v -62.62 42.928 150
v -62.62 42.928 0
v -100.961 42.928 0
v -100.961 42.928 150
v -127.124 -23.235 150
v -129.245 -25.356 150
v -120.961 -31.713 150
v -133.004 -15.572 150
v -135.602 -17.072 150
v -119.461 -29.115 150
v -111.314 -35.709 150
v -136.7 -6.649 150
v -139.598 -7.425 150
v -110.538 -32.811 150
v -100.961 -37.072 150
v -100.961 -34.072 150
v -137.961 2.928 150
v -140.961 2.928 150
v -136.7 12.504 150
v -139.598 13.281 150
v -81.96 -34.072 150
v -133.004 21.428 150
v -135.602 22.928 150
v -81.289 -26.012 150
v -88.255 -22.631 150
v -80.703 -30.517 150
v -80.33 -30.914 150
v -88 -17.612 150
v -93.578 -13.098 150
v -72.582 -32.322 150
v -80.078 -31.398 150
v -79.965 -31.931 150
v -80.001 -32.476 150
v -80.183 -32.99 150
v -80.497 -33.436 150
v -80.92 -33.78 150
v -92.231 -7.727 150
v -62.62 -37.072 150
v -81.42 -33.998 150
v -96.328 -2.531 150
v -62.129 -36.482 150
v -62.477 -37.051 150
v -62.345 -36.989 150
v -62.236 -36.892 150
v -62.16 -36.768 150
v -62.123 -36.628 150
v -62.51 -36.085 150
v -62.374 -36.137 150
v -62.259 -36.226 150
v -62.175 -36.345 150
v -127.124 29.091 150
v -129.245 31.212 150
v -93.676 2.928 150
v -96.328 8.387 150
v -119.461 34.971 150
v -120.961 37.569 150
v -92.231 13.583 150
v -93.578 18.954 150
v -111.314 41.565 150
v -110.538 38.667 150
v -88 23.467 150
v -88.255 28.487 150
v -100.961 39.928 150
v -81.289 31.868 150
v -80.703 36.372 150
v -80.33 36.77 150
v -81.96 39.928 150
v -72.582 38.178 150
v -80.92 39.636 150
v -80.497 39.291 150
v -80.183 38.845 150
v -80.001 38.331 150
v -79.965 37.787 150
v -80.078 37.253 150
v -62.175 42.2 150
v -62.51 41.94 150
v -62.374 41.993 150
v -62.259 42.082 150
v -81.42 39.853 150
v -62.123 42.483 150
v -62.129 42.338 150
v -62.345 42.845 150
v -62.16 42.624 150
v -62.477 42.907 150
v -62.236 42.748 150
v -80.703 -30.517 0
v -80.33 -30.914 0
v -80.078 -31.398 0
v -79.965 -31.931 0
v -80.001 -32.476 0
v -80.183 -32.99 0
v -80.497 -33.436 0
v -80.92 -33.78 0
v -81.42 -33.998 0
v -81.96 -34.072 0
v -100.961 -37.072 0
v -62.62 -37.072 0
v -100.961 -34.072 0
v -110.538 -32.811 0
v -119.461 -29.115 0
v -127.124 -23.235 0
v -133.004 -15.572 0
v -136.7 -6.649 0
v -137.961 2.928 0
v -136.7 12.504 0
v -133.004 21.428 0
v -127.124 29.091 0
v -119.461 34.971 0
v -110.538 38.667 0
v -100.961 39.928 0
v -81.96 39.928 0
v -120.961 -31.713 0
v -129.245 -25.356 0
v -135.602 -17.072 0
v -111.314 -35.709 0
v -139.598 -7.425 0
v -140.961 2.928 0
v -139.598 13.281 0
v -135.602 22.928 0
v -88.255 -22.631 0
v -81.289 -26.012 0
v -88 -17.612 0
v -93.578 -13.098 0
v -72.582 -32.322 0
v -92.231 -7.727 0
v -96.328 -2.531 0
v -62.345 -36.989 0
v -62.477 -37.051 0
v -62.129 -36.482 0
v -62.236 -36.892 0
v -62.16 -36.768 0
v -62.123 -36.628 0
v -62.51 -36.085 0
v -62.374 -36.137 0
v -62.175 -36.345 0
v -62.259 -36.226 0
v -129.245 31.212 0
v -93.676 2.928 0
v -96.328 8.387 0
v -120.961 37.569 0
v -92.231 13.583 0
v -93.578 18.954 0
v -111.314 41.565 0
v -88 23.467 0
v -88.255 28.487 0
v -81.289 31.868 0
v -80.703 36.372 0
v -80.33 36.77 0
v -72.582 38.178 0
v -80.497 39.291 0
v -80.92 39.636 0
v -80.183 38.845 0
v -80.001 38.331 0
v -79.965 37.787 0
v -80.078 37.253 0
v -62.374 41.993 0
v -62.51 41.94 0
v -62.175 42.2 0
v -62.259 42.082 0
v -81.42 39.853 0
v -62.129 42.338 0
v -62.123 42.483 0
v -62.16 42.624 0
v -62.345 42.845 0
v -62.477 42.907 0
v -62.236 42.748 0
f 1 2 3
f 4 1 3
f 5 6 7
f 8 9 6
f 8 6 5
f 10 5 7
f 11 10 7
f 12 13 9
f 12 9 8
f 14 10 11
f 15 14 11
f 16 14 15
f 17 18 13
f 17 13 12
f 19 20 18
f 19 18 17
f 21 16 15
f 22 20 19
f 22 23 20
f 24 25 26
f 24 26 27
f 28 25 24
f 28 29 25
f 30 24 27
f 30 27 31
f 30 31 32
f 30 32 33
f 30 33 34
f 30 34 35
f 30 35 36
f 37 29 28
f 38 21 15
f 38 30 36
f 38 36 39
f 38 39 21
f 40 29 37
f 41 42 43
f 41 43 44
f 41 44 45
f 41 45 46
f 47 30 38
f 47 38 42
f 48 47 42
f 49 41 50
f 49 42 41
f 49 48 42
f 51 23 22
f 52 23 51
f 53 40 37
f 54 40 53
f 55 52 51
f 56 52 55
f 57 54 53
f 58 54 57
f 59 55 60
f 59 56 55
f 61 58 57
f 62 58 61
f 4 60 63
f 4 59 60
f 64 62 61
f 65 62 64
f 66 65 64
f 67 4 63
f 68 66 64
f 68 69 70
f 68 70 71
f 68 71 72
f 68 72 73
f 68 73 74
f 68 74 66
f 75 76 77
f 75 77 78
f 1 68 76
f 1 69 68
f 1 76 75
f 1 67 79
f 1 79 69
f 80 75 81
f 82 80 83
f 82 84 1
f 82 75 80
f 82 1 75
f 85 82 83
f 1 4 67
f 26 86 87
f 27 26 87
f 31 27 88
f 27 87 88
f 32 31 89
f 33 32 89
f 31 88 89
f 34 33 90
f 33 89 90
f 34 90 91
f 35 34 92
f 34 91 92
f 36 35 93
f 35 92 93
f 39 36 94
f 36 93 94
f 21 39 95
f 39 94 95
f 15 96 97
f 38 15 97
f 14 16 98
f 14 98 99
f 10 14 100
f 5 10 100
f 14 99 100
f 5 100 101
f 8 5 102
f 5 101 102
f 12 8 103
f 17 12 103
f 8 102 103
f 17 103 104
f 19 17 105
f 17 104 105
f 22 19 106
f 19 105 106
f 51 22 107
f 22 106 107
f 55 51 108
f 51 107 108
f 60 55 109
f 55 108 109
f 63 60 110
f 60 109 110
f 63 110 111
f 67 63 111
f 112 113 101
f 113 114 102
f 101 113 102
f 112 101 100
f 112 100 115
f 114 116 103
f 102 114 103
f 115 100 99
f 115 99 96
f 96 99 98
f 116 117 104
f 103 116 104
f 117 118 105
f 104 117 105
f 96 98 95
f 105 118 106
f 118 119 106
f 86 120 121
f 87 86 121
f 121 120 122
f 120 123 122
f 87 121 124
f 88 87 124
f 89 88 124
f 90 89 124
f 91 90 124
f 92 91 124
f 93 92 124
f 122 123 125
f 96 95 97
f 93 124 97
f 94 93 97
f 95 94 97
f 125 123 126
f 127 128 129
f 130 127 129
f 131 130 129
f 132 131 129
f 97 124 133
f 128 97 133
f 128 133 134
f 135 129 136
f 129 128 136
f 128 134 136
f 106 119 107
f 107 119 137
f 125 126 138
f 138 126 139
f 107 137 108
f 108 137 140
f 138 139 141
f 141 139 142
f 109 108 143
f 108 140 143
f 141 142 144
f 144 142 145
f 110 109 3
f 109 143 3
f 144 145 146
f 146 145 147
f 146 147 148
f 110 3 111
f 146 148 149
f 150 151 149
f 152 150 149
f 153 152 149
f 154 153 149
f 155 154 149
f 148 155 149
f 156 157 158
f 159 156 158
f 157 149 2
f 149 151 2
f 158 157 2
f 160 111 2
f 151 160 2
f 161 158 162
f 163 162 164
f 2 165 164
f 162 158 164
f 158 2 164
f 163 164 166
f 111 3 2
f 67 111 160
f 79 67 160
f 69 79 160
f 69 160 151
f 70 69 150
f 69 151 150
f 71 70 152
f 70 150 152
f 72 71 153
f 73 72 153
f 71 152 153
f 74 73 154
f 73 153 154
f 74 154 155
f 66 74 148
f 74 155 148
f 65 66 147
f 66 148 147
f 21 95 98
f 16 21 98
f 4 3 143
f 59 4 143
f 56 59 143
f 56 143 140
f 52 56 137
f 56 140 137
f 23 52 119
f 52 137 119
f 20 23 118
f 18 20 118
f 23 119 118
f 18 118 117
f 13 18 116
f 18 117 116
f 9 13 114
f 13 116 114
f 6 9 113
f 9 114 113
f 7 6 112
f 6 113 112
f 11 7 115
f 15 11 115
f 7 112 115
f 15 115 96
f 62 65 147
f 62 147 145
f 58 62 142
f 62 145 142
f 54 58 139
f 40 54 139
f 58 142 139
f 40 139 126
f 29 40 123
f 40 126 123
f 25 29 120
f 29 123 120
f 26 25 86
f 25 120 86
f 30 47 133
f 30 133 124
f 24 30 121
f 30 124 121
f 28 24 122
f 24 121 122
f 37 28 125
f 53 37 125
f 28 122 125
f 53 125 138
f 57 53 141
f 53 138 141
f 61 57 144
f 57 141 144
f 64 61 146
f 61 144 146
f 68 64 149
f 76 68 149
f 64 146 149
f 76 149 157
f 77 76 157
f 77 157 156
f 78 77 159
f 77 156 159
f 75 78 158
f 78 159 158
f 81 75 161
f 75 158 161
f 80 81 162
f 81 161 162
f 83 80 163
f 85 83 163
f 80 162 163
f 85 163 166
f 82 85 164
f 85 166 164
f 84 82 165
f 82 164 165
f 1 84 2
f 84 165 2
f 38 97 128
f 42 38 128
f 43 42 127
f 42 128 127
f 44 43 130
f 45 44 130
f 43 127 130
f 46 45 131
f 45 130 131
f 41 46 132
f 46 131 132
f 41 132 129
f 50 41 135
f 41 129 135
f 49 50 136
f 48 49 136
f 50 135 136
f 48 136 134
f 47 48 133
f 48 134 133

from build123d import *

# Parameters (mm, degrees)
F1_DEPTH = 150


with BuildPart() as f1:
    # F0 (on Top) → F1 (new body)
    with BuildSketch(Plane.XY):
        with BuildLine():
            ThreePointArc((-62.509962, -36.084558), (-93.676113, 2.927788), (-62.509962, 41.940134))
            ThreePointArc((-62.509962, 41.940134), (-62.123481, 42.483344), (-62.620385, 42.927788))
            Line((-62.620385, 42.927788), (-100.961201, 42.927788))
            ThreePointArc((-100.961201, 42.927788), (-140.961201, 2.927788), (-100.961201, -37.072212))
            Line((-100.961201, -37.072212), (-62.620385, -37.072212))
            ThreePointArc((-62.620385, -37.072212), (-62.123481, -36.627767), (-62.509962, -36.084558))
        make_face()
        with BuildLine():
            ThreePointArc((-100.961201, -34.072212), (-137.961201, 2.927788), (-100.961201, 39.927788))
            Line((-100.961201, 39.927788), (-81.960385, 39.927788))
            ThreePointArc((-81.960385, 39.927788), (-80.074767, 38.594455), (-80.703306, 36.372233))
            ThreePointArc((-80.703306, 36.372233), (-96.676113, 2.927788), (-80.703306, -30.516656))
            ThreePointArc((-80.703306, -30.516656), (-80.074767, -32.738879), (-81.960385, -34.072212))
            Line((-81.960385, -34.072212), (-100.961201, -34.072212))
        make_face(mode=Mode.SUBTRACT)
    extrude(amount=F1_DEPTH)


solid = f1.part
